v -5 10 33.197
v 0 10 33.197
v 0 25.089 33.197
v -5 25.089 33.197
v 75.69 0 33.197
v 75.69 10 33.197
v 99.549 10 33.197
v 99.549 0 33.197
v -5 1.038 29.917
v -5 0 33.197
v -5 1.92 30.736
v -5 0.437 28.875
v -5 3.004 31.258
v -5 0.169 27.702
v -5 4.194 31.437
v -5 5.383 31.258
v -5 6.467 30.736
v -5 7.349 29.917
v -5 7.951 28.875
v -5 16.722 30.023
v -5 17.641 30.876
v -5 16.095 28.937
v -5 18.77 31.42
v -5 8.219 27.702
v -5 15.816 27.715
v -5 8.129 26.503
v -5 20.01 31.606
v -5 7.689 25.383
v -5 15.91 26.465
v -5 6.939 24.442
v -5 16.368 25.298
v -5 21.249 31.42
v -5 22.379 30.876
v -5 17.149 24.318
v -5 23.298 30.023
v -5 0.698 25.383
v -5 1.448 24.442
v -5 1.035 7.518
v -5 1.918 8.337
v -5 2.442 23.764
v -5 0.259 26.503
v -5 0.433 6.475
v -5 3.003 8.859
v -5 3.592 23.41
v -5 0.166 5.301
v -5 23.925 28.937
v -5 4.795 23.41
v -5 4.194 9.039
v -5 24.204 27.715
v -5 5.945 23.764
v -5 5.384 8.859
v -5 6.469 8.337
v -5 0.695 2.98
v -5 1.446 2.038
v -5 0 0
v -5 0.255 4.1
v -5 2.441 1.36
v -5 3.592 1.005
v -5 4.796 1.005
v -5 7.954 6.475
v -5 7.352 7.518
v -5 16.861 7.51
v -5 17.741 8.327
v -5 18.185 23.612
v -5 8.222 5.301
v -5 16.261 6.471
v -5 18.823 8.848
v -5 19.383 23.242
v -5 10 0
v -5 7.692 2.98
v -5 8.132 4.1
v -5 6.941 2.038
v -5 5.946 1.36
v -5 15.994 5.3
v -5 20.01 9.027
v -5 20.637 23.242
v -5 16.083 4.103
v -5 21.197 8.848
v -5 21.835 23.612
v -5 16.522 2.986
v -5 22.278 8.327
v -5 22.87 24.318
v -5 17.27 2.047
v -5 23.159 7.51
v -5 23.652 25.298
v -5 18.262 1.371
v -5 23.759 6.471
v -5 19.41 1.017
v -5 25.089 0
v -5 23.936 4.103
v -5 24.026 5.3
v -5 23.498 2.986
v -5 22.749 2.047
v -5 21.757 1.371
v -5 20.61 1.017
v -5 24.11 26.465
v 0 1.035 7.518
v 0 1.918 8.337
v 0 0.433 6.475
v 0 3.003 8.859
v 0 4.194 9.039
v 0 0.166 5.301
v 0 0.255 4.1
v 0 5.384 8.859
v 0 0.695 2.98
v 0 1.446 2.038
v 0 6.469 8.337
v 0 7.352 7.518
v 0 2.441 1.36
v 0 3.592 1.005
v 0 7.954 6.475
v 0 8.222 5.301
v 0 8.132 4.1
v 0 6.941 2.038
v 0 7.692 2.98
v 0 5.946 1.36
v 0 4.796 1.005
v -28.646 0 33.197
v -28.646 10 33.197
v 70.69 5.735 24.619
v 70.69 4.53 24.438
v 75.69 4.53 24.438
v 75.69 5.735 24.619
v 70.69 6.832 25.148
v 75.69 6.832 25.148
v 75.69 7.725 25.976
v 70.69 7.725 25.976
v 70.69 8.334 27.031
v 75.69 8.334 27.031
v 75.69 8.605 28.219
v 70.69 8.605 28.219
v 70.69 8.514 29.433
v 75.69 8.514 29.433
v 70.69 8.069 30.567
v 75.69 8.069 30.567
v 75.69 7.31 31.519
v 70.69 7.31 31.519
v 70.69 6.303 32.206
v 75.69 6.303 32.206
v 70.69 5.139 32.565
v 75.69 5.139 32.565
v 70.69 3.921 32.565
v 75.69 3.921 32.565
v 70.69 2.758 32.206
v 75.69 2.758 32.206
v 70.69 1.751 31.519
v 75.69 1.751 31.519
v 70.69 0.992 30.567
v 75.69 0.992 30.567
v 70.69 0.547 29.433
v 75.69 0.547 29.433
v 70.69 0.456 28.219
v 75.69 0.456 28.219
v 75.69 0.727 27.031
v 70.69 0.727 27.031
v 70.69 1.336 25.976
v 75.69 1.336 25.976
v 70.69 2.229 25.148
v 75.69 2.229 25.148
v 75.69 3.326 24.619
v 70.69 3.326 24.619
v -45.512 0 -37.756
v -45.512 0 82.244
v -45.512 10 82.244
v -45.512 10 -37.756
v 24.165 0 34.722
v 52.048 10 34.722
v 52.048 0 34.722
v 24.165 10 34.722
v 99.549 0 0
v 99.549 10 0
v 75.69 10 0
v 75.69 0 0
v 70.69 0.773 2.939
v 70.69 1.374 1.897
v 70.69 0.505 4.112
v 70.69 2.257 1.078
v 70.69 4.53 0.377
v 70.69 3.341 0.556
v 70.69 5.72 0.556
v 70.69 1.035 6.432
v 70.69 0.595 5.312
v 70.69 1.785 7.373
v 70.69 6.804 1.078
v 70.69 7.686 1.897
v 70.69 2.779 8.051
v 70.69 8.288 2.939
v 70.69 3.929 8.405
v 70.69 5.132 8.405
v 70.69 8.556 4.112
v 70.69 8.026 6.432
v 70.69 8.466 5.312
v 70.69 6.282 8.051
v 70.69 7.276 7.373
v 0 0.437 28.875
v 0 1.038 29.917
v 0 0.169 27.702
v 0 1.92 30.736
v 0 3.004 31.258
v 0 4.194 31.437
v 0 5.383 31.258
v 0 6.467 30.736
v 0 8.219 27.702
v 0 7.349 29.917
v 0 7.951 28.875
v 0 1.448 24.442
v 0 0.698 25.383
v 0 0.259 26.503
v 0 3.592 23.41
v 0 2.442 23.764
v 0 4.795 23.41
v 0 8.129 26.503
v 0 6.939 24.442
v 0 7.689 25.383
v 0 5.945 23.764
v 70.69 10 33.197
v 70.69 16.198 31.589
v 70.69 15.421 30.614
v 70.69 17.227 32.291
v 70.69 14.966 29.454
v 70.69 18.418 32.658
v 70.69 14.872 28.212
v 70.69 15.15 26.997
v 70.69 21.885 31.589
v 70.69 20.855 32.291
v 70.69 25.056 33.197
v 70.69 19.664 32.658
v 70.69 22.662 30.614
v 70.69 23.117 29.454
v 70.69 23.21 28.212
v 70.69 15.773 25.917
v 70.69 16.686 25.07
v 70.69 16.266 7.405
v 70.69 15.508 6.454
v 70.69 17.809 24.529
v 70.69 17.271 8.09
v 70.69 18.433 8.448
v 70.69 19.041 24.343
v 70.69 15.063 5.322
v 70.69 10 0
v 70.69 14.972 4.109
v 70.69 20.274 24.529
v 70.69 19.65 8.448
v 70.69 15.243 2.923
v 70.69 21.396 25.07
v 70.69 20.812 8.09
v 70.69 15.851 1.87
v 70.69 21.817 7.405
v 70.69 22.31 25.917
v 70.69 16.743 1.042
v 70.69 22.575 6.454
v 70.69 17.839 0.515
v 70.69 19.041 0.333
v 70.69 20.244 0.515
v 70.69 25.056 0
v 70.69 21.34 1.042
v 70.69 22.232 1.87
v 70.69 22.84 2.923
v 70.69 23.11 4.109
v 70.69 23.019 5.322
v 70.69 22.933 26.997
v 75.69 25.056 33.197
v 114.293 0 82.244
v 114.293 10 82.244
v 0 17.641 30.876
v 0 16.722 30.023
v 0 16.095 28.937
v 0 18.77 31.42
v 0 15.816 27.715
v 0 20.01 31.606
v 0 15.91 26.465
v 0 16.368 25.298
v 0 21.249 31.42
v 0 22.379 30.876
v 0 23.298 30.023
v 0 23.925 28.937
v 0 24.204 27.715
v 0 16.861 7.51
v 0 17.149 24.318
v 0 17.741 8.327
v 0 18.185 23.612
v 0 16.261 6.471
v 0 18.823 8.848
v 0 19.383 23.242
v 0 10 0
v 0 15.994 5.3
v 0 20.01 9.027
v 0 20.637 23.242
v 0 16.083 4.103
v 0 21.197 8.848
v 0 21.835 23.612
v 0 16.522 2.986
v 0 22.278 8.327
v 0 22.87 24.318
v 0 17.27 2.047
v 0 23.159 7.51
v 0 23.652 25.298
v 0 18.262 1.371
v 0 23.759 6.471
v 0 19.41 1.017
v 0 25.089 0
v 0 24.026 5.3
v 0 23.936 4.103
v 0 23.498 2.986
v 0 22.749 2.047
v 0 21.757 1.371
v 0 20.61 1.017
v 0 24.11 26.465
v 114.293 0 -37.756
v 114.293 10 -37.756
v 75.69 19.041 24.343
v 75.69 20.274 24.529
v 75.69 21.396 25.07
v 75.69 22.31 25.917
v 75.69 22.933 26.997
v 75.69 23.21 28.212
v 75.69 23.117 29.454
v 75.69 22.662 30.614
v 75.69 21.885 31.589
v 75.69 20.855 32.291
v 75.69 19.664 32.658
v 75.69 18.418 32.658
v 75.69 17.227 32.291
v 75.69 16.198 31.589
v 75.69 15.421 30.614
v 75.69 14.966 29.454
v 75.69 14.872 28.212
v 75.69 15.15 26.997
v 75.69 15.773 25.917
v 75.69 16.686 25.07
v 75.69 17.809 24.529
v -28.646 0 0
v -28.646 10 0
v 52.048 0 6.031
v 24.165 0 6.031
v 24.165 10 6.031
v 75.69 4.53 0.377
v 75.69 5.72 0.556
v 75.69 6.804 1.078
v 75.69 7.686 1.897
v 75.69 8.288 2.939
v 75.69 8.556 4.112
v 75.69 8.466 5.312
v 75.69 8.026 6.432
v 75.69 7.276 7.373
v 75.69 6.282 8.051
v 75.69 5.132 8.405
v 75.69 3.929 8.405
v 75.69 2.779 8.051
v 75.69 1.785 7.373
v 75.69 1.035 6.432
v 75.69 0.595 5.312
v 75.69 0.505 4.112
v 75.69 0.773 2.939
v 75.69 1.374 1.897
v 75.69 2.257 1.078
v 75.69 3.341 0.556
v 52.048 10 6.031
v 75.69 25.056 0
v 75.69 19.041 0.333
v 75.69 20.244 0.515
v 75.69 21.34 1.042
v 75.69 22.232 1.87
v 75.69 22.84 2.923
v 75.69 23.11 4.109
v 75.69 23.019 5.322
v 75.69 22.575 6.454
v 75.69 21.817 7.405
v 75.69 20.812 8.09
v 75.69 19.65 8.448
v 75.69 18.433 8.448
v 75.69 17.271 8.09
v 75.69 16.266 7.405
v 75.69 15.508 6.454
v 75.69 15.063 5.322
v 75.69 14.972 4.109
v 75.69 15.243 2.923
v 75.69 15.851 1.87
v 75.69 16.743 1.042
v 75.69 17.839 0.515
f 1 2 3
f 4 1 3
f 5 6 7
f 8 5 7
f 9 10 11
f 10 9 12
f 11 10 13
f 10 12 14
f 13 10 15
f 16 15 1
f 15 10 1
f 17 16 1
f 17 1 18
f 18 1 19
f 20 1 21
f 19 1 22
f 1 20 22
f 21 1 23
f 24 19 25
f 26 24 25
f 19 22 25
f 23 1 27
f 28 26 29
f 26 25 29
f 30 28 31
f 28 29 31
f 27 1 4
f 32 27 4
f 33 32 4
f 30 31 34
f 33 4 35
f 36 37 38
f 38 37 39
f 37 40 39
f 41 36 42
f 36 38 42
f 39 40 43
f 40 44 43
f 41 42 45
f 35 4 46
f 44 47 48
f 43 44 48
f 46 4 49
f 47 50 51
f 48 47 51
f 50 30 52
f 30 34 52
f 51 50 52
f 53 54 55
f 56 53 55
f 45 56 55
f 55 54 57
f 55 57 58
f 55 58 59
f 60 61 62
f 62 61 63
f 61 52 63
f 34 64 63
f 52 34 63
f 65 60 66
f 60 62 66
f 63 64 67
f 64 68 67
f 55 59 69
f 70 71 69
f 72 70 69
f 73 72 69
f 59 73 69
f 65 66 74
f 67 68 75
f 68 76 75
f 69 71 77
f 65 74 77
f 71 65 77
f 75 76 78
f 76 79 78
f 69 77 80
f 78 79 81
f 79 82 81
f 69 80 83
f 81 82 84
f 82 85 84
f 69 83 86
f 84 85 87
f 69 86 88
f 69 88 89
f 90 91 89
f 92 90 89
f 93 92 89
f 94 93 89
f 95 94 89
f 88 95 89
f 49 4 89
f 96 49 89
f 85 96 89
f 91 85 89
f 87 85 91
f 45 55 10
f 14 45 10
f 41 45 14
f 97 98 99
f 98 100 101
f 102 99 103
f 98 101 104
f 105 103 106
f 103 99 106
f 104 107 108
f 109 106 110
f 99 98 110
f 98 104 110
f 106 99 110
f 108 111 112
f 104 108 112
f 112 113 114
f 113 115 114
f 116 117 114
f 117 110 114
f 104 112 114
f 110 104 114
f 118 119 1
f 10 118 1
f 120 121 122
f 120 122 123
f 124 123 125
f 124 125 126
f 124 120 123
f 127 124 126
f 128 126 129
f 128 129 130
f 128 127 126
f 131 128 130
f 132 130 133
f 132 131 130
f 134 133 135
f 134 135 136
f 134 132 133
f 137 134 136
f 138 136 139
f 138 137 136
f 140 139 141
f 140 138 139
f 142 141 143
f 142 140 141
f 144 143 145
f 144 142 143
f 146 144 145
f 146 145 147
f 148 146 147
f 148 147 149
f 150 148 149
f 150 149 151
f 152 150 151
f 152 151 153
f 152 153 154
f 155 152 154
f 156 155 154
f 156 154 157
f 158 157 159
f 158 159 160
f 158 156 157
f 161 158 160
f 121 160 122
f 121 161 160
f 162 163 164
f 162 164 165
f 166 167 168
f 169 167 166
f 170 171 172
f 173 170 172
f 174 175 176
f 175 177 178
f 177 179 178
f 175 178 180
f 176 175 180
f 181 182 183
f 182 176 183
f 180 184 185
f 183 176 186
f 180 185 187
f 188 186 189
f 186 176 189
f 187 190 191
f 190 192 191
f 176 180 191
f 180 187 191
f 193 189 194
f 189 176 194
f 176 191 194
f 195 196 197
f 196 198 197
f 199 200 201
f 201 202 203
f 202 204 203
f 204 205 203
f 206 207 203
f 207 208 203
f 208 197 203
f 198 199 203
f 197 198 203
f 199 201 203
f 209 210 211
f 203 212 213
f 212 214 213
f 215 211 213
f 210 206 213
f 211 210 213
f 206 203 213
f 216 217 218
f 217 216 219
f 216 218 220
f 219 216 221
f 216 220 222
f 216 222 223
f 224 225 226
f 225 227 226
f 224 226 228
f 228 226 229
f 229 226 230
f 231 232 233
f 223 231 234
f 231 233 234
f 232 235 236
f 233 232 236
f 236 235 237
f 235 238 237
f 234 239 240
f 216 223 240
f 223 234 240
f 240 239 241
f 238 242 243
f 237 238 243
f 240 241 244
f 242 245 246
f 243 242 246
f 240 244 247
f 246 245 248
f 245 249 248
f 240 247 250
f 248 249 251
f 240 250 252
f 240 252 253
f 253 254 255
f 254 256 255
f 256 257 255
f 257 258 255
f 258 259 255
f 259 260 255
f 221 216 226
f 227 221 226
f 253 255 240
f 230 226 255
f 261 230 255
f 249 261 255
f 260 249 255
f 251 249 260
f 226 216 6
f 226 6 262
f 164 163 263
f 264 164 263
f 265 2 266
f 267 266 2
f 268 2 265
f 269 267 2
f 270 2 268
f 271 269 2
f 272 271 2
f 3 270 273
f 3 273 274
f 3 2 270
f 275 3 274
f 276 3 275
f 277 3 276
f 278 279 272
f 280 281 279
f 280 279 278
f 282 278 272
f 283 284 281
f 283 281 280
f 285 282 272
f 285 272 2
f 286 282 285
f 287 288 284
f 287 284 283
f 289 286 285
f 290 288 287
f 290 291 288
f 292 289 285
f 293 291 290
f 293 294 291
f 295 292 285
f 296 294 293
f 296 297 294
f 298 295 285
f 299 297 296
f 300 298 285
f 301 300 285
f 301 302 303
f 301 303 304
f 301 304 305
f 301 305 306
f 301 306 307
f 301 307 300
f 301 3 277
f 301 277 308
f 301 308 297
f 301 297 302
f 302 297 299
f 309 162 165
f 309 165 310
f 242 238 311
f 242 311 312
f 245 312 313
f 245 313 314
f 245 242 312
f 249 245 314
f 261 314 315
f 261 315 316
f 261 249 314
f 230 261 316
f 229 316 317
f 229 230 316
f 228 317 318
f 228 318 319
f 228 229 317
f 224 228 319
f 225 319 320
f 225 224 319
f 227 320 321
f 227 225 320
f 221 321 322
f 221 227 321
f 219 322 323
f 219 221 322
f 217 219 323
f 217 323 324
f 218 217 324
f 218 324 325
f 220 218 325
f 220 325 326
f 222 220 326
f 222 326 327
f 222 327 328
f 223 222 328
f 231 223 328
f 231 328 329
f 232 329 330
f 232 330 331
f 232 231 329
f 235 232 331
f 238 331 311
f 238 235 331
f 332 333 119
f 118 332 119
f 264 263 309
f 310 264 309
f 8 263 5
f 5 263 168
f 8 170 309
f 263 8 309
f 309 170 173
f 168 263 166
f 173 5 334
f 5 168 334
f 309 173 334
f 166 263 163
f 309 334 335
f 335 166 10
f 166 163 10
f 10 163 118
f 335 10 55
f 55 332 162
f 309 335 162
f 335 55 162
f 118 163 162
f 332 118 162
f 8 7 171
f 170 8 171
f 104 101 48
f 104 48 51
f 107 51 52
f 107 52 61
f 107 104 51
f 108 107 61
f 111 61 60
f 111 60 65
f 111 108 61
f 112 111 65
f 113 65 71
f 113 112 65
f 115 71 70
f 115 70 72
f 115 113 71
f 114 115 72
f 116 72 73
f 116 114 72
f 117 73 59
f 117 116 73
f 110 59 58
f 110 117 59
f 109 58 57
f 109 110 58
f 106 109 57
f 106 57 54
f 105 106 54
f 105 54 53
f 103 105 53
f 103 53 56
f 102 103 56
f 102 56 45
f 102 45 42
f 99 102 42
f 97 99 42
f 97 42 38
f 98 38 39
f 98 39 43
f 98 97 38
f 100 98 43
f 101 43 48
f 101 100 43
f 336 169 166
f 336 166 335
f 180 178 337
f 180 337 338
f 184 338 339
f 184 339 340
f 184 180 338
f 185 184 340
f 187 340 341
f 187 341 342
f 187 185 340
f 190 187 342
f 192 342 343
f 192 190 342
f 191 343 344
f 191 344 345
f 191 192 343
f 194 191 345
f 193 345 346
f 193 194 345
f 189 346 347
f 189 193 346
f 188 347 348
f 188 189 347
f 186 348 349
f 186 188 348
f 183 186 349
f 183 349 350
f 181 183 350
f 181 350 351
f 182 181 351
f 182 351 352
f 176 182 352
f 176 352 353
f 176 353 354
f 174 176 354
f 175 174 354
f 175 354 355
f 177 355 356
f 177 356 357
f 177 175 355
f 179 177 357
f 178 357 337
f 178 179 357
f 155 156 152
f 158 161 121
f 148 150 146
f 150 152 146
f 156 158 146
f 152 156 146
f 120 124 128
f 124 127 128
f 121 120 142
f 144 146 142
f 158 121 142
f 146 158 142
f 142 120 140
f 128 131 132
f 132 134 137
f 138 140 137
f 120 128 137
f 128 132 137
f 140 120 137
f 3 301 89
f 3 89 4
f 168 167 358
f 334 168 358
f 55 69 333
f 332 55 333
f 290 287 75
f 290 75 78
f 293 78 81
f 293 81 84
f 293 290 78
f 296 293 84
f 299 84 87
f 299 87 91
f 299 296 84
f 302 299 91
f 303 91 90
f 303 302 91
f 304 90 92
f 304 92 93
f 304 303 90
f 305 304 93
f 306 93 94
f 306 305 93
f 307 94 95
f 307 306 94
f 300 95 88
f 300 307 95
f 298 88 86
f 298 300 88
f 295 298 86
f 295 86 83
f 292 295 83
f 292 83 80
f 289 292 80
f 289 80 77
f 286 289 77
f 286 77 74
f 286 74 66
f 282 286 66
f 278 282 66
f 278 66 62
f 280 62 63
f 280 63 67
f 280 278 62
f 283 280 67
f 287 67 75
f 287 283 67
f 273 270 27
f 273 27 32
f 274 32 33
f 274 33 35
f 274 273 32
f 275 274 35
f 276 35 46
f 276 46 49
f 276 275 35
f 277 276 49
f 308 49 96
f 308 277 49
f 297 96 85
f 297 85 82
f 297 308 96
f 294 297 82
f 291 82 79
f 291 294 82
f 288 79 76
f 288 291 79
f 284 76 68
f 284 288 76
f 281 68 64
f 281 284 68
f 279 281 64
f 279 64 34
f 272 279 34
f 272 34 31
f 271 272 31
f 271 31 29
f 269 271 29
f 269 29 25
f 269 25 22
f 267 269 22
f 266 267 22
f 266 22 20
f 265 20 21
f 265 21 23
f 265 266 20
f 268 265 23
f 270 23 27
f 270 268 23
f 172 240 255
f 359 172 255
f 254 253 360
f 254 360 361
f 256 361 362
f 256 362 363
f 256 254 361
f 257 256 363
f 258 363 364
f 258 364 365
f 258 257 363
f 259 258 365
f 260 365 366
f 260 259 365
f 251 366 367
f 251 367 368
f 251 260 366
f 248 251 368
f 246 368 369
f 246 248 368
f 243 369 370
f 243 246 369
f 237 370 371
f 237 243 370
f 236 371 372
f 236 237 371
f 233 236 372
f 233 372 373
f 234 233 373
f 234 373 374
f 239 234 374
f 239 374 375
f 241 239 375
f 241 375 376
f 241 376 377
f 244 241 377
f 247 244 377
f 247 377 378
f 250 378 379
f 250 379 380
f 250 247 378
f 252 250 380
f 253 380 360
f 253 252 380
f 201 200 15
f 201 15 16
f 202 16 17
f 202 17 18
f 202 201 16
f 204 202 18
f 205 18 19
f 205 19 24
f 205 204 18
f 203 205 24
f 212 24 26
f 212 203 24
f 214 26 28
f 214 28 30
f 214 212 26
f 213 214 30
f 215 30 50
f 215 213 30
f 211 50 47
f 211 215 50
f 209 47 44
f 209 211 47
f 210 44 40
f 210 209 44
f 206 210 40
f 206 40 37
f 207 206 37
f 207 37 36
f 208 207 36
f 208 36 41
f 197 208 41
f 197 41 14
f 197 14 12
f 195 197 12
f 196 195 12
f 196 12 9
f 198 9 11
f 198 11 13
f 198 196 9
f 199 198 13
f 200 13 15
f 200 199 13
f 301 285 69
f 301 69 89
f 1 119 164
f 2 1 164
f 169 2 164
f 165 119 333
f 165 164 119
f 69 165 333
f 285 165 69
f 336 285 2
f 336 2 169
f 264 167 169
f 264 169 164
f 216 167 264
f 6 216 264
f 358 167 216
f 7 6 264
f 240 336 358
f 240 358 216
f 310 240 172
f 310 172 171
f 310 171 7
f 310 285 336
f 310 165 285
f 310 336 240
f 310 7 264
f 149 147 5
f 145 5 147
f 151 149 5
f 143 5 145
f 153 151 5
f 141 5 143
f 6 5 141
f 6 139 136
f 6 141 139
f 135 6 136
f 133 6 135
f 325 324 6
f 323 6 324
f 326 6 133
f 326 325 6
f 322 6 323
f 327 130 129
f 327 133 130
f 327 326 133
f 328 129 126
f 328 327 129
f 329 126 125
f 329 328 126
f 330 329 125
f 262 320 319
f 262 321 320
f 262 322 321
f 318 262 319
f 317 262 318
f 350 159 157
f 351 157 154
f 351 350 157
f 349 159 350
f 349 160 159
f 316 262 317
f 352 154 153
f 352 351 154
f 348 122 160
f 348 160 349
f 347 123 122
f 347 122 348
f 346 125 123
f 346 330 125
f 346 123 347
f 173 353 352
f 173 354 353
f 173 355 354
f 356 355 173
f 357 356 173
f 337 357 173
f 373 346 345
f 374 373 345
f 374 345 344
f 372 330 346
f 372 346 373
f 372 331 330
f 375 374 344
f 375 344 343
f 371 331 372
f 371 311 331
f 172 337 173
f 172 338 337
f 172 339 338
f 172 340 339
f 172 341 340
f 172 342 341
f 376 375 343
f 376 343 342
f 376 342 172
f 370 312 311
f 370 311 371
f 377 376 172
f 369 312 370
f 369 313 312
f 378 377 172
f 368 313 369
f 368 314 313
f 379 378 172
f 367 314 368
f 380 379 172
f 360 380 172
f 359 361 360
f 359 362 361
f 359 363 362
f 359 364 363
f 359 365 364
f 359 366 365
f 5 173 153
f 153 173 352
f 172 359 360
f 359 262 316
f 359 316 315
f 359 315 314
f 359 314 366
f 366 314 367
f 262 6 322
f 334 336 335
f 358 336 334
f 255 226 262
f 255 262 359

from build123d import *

# Parameters (mm, degrees)
SKETCH3_W               = 159.804878049
SKETCH3_H               = 120
BOSS_EXTRUDE1_DEPTH     = 10
CUT_EXTRUDE1_DEPTH      = 20
CUT_EXTRUDE3_DEPTH      = 10
CUT_EXTRUDE3_DEPTH_BACK = 16
SKETCH5_R               = 3
CUT_EXTRUDE6_DEPTH      = 10
SKETCH8_R               = 4.027386095
SKETCH8_R_2             = 4.205627654
SKETCH8_R_3             = 4.039456984
SKETCH8_R_4             = 4.036176238
BOSS_EXTRUDE3_DEPTH     = 5
SKETCH9_W               = 33.196532324
SKETCH9_H               = 25.056213838
SKETCH9_R               = 4.18060077
SKETCH9_R_2             = 4.080354001
SKETCH9_R_3             = 4.086165431
SKETCH9_R_4             = 4.036615778
BOSS_EXTRUDE4_DEPTH     = 5


with BuildPart() as part:
    # Sketch3 → Boss-Extrude1 (new body)
    with BuildSketch(Plane(origin=(0, 0, 0), x_dir=(1, 0, 0), z_dir=(0, 1, 0))):
        with Locations((34.390243903, -22.243902439)):
            Rectangle(SKETCH3_W, SKETCH3_H)
    extrude(amount=BOSS_EXTRUDE1_DEPTH)

    # Sketch4 → Cut-Extrude1 (cut)
    with BuildSketch(Plane(origin=(0, 10, 0), x_dir=(1, 0, 0), z_dir=(0, 1, 0))):
        Polygon((52.048199058, -16.00595694), (52.048199058, -34.721676718), (24.165287655, -34.721676718), (24.165287655, -6.031004918), (52.048199058, -6.031004918), align=None)
    extrude(amount=-CUT_EXTRUDE1_DEPTH, mode=Mode.SUBTRACT)

    # Sketch5 → Cut-Extrude3 (cut, two sides: drawn at the far end of the back side and taken through both)
    with BuildSketch(Plane(origin=(0, 10, 0), x_dir=(1, 0, 0), z_dir=(0, 1, 0)).offset(-CUT_EXTRUDE3_DEPTH_BACK)):
        with Locations(Location((-15.512195122, -22.243902439, 0), (0, 0, 270))):
            Circle(SKETCH5_R)
        with Locations(Location((84.292682927, -22.243902439, 0), (0, 0, 270))):
            Circle(SKETCH5_R)
    extrude(amount=CUT_EXTRUDE3_DEPTH + CUT_EXTRUDE3_DEPTH_BACK, mode=Mode.SUBTRACT)

    # Sketch7 → Cut-Extrude6 (cut)
    with BuildSketch(Plane(origin=(0, 10, 0), x_dir=(1, 0, 0), z_dir=(0, 1, 0))):
        Polygon((-6.403519992, -33.196532324), (0, -33.196532324), (0, 0), (-6.403519992, 0), (-28.646264147, 0), (-28.646264147, -33.196532324), align=None)
        Polygon((70.689603866, -33.196532324), (77.304662661, -33.196532324), (99.548678473, -33.196532324), (99.548678473, 0), (77.304662661, 0), (70.689603866, 0), align=None)
    extrude(amount=-CUT_EXTRUDE6_DEPTH, mode=Mode.SUBTRACT)

    # Sketch8 → Boss-Extrude3 (add)
    with BuildSketch(Plane.ZY):
        Polygon((0, 0), (0, 25.089225982), (33.196532324, 25.089225982), (33.196532324, 22.465752332), (33.196532324, 0), align=None)
        with Locations((4.999328758, 20.009772327)):
            Circle(SKETCH8_R, mode=Mode.SUBTRACT)
        with Locations((27.400871365, 20.009772327)):
            Circle(SKETCH8_R_2, mode=Mode.SUBTRACT)
        with Locations((4.999328758, 4.193672126)):
            Circle(SKETCH8_R_3, mode=Mode.SUBTRACT)
        with Locations((27.400871365, 4.193672126)):
            Circle(SKETCH8_R_4, mode=Mode.SUBTRACT)
    extrude(amount=BOSS_EXTRUDE3_DEPTH)

    # Sketch9 → Boss-Extrude4 (add)
    with BuildSketch(Plane(origin=(70.689603866, 0, 0), x_dir=(0, 0, -1), z_dir=(1, 0, 0))):
        with Locations((-16.598266162, 12.528106919)):
            Rectangle(SKETCH9_W, SKETCH9_H)
        with Locations((-28.524013472, 19.041369902)):
            Circle(SKETCH9_R, mode=Mode.SUBTRACT)
        with Locations((-4.413648361, 19.041369902)):
            Circle(SKETCH9_R_2, mode=Mode.SUBTRACT)
        with Locations((-28.524013472, 4.530421359)):
            Circle(SKETCH9_R_3, mode=Mode.SUBTRACT)
        with Locations((-4.413648361, 4.530421359)):
            Circle(SKETCH9_R_4, mode=Mode.SUBTRACT)
    extrude(amount=BOSS_EXTRUDE4_DEPTH)


solid = part.part
